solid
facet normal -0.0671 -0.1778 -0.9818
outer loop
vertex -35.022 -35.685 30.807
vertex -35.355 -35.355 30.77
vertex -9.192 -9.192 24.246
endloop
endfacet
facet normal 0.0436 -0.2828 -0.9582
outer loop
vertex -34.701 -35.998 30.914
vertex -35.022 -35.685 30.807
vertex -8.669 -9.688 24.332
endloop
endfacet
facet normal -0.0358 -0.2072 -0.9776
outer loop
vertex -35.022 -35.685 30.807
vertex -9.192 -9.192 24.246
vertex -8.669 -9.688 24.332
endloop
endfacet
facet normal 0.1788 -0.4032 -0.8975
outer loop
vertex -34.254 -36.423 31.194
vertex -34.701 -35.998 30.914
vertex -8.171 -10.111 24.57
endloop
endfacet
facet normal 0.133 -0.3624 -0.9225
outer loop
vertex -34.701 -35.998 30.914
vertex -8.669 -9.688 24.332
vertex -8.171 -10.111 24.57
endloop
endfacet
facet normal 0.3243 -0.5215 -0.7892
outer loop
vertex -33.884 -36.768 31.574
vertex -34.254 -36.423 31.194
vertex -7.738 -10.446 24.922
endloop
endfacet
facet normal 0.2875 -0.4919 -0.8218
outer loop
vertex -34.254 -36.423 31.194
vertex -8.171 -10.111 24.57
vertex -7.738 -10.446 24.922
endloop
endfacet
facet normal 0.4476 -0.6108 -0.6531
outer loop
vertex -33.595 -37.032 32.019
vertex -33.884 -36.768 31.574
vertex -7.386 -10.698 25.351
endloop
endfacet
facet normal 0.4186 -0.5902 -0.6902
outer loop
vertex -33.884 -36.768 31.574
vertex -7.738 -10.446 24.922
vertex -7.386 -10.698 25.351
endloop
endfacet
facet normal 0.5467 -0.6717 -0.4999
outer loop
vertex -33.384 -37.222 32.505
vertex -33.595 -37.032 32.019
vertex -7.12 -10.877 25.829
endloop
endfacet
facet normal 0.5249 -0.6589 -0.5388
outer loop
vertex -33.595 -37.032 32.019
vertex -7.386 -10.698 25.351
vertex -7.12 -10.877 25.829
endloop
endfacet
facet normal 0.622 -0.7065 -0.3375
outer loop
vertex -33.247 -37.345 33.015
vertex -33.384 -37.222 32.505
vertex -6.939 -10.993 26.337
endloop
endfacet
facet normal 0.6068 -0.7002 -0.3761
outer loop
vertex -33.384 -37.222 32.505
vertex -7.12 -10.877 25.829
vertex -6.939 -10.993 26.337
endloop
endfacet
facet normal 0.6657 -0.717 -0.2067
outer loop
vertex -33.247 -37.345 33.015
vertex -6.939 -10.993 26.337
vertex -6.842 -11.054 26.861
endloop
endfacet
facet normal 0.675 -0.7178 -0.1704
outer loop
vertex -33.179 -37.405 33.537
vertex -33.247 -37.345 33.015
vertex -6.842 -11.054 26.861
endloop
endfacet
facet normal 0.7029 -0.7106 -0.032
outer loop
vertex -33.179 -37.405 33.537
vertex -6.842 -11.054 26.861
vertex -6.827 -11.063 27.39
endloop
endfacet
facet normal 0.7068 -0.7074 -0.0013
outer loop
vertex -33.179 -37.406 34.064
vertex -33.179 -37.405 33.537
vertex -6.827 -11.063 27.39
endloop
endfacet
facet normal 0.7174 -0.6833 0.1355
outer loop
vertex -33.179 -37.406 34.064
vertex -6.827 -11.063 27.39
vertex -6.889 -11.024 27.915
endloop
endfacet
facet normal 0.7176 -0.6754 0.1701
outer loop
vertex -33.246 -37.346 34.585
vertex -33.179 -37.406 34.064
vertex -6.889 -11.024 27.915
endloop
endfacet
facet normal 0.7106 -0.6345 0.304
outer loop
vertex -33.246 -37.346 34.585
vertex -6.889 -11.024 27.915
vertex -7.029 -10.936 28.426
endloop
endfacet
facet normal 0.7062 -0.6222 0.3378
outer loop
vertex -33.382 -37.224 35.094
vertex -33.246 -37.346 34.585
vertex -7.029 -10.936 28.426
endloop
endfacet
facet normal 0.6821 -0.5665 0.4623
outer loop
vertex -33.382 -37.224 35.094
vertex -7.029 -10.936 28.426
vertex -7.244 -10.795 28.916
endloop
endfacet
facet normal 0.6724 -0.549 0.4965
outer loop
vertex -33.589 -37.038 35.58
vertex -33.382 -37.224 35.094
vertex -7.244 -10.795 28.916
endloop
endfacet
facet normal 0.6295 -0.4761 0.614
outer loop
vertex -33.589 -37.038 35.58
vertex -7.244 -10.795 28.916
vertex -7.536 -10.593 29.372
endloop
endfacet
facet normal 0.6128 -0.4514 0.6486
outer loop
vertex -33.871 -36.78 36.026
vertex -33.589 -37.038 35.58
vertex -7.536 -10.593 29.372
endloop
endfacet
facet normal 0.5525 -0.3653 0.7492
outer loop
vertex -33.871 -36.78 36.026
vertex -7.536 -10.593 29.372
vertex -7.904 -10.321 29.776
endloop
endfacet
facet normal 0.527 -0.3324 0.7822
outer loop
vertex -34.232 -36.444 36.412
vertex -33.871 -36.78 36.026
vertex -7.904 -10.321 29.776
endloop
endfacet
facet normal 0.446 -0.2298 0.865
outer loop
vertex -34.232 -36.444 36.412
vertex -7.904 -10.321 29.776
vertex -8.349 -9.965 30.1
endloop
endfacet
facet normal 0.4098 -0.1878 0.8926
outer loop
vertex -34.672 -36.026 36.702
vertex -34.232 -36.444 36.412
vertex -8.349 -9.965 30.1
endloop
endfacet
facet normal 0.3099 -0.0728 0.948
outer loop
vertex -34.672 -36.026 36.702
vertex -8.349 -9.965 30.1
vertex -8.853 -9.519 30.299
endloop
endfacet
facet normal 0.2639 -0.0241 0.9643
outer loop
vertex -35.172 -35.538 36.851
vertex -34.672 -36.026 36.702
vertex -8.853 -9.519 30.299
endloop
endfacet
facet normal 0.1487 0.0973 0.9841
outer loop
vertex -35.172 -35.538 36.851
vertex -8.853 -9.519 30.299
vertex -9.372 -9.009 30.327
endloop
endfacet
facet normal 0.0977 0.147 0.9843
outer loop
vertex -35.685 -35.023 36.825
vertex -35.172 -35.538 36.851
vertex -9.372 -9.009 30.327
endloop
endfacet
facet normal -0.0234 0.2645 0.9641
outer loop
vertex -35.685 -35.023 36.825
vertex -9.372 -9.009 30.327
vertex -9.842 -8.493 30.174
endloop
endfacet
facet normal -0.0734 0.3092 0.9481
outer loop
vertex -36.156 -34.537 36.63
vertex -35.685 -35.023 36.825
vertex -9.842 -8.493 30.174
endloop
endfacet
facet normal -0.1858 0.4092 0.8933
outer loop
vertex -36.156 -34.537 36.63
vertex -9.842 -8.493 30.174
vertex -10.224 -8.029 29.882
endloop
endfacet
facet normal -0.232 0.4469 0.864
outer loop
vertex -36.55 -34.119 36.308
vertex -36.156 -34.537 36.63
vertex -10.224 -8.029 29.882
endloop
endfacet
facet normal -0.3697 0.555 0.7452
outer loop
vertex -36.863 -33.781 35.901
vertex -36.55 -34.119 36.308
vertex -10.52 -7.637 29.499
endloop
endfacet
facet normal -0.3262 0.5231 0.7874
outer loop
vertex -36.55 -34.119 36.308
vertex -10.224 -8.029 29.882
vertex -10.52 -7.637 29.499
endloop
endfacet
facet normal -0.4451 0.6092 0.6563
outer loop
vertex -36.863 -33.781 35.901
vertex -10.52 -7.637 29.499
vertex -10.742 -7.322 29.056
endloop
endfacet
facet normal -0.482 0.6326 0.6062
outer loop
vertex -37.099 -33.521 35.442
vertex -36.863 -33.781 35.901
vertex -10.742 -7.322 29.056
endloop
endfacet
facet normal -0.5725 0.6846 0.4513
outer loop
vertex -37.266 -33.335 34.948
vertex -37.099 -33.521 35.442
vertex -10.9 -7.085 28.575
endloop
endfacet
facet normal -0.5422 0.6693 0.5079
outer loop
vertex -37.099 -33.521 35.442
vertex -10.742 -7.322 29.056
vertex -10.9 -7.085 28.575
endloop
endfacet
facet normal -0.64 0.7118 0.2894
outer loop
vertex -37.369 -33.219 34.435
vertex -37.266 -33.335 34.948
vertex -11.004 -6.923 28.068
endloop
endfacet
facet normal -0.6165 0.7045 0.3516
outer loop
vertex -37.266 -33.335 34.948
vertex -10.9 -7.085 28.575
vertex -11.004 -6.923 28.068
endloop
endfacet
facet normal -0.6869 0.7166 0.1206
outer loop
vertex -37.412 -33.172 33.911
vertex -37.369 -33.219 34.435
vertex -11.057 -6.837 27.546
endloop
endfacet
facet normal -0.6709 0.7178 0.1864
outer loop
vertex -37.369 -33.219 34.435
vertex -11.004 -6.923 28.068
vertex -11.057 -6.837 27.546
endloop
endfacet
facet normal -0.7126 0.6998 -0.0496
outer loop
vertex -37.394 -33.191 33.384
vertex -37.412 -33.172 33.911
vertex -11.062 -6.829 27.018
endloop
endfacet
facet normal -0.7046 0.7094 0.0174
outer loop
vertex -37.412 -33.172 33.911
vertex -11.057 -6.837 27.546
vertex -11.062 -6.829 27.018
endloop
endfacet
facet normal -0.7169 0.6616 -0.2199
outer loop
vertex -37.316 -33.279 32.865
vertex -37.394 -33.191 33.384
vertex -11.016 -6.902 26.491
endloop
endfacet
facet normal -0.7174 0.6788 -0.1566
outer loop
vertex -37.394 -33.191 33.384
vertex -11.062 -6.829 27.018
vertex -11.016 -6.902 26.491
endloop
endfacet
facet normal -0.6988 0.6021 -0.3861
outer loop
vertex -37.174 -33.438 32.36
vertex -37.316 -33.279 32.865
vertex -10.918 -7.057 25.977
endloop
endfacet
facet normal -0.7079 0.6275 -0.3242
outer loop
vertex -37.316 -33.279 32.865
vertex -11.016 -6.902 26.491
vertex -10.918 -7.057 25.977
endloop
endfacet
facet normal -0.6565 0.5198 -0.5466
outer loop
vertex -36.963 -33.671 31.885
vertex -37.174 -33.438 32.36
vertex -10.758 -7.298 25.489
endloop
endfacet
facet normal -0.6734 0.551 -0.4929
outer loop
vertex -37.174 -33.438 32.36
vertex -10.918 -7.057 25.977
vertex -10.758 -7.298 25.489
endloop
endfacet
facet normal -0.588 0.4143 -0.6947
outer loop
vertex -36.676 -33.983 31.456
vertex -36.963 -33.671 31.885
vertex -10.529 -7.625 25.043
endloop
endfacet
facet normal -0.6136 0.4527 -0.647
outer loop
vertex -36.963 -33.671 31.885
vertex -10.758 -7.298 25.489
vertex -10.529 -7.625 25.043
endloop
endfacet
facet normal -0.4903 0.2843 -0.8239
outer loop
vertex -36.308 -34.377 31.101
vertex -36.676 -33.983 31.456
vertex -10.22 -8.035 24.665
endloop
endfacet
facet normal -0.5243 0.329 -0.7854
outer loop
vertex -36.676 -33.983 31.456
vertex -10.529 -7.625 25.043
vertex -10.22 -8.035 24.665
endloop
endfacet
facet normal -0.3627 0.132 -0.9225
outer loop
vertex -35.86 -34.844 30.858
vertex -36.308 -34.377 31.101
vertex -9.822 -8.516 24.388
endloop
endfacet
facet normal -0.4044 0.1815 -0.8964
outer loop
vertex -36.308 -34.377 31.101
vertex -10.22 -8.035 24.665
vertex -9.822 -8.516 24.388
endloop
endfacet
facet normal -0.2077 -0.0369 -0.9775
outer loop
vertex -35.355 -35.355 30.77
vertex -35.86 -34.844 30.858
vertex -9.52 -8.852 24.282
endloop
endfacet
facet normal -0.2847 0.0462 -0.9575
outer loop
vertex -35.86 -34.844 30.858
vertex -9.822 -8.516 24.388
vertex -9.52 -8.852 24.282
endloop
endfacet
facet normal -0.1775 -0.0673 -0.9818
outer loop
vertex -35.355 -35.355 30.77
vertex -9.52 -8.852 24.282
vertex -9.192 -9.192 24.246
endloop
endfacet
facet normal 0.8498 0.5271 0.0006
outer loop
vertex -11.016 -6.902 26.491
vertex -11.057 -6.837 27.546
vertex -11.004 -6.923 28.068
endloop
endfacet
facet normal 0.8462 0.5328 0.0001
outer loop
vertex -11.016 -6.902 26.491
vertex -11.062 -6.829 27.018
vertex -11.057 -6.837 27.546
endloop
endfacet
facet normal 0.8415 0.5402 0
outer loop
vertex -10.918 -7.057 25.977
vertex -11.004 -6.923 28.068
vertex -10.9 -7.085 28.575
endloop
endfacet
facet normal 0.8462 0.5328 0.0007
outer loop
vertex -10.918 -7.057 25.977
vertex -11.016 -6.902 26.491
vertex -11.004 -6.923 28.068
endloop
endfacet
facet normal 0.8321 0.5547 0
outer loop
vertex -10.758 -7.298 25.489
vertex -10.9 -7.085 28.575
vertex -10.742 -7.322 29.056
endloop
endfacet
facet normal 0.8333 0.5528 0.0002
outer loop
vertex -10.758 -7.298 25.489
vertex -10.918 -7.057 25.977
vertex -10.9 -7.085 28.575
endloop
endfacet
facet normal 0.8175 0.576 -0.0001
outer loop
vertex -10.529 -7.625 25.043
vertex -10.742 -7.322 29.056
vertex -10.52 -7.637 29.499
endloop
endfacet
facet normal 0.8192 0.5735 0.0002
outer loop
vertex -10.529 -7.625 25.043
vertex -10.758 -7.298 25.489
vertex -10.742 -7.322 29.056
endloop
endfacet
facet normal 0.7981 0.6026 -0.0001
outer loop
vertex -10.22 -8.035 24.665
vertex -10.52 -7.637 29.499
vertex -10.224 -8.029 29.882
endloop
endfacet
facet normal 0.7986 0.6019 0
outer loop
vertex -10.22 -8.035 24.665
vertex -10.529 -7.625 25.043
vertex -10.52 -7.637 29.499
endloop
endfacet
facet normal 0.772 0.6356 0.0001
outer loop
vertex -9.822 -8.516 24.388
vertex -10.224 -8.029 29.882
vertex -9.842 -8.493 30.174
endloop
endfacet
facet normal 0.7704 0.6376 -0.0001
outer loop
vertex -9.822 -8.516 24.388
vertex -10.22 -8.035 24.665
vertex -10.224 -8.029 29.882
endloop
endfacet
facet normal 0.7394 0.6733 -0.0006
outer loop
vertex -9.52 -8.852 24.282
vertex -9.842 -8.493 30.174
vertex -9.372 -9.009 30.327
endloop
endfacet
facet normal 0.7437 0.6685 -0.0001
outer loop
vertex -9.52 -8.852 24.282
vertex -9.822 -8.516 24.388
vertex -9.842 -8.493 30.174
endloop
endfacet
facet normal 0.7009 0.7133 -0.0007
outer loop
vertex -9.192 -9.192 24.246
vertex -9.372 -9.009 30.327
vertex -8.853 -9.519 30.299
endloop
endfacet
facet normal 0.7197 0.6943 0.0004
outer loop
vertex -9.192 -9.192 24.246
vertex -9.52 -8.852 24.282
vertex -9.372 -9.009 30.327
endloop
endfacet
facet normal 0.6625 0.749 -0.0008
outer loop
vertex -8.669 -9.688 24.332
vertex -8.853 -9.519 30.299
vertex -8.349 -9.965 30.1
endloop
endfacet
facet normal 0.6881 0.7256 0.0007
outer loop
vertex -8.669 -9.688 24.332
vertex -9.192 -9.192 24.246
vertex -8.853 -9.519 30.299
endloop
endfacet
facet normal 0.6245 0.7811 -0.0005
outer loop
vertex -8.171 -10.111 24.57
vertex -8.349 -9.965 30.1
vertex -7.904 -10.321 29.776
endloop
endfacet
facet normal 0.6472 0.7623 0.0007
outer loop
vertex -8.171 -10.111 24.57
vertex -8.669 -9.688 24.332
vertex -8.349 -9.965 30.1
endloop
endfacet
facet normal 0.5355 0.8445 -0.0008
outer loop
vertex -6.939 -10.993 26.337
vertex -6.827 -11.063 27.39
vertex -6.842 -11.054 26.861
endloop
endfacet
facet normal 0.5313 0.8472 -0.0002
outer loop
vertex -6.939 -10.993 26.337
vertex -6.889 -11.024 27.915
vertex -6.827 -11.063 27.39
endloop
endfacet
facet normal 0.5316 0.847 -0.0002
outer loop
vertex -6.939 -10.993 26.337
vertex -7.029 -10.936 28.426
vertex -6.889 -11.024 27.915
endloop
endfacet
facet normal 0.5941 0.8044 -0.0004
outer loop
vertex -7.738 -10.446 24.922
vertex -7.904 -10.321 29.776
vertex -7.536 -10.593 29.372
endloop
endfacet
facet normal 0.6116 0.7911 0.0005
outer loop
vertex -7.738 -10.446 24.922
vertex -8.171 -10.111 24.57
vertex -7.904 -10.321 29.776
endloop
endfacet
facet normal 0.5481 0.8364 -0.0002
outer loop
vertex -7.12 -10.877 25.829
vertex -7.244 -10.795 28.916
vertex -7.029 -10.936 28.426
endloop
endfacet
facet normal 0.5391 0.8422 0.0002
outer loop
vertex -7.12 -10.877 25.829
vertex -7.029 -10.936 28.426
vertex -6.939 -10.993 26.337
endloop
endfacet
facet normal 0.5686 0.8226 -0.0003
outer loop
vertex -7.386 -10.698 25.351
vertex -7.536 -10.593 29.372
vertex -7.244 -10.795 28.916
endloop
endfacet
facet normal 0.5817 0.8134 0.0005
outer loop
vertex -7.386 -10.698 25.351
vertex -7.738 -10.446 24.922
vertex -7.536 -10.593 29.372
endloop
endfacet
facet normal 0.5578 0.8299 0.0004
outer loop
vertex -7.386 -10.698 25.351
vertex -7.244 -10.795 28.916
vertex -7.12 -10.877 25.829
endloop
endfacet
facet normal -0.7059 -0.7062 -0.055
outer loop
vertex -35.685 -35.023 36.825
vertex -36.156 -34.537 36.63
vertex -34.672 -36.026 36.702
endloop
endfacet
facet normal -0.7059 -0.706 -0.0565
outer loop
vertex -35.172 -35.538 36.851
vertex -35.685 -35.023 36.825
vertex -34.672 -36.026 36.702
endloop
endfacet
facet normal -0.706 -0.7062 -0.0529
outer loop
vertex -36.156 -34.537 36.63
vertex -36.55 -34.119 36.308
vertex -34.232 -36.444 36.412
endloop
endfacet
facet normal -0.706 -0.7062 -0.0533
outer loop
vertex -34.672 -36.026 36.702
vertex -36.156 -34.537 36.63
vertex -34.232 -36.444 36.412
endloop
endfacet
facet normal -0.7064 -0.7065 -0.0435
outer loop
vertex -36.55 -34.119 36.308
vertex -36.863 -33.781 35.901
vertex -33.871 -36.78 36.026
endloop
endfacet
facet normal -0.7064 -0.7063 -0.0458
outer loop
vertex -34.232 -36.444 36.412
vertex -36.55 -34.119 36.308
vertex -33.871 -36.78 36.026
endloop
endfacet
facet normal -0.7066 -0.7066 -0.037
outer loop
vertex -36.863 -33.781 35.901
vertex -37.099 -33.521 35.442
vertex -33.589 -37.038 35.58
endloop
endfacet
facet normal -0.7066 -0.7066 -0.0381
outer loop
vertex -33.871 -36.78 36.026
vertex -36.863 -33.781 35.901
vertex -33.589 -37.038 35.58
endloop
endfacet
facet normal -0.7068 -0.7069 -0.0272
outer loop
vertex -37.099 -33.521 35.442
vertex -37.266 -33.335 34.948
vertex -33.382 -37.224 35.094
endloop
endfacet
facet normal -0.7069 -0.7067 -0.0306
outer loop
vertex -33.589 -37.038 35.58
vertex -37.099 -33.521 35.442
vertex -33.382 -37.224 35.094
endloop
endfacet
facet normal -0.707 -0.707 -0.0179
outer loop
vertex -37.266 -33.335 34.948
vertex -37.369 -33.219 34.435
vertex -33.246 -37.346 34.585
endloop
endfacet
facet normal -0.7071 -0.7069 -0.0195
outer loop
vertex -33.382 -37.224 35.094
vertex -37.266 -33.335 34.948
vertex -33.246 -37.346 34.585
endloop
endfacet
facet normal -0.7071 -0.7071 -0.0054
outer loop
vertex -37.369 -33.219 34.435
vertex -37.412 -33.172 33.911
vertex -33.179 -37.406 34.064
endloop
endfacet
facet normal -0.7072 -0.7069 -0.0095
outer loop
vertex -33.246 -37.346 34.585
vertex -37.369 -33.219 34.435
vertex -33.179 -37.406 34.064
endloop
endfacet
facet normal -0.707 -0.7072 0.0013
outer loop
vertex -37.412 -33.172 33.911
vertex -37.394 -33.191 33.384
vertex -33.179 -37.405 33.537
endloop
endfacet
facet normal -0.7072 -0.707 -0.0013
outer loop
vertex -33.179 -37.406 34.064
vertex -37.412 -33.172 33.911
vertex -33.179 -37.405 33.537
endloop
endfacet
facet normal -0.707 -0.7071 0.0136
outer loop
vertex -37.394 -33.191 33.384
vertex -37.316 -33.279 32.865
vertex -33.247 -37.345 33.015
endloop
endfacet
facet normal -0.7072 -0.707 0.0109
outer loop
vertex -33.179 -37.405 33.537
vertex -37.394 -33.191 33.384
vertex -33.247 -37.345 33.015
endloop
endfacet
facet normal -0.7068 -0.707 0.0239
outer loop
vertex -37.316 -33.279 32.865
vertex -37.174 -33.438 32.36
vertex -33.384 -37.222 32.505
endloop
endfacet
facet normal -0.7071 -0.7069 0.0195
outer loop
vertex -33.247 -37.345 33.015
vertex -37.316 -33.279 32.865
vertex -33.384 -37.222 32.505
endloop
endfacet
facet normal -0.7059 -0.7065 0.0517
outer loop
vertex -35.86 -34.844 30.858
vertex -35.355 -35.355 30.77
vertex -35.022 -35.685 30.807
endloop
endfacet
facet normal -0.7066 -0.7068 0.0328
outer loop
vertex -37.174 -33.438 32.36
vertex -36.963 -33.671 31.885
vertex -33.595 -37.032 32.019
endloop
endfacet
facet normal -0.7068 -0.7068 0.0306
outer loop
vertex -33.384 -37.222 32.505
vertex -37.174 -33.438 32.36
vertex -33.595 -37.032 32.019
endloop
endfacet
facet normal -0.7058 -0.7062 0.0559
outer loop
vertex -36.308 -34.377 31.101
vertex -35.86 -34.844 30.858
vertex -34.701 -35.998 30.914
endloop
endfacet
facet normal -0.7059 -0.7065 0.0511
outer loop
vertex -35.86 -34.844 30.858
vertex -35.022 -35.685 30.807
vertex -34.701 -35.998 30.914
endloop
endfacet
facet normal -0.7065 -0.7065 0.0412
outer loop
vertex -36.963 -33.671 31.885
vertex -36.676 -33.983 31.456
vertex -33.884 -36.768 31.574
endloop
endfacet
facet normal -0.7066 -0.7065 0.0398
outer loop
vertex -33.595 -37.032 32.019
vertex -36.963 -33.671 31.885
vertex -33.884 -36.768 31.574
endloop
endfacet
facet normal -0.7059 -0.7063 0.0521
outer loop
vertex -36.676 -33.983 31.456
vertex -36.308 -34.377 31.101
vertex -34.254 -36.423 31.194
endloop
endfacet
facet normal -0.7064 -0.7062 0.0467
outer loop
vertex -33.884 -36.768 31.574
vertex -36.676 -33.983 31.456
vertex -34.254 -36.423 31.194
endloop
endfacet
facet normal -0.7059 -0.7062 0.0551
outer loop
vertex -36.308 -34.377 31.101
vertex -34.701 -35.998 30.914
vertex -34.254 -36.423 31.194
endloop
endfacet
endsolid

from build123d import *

# Parameters (mm, degrees)
CYLINDER015_R               = 50
CYLINDER015_DEPTH           = 67
CYLINDER014_R               = 55
CYLINDER014_DEPTH           = 67
CYLINDER013_R               = 13
CYLINDER013_DEPTH           = 60
CYLINDER012_R               = 3
CYLINDER012_DEPTH           = 54
CYLINDER012_PLACEMENT_ANGLE = 80
CUT009_PLACEMENT_ANGLE      = 45


with BuildPart() as inner001:
    # Cylinder015 → Cylinder015 (new body)
    with BuildSketch(Plane.XY):
        Circle(CYLINDER015_R)
    extrude(amount=CYLINDER015_DEPTH)


with BuildPart() as case001:
    # Cylinder014 → Cylinder014 (new body)
    with BuildSketch(Plane.XY):
        Circle(CYLINDER014_R)
    extrude(amount=CYLINDER014_DEPTH)

    # Cut008: cut Inner001
    add(inner001.part, mode=Mode.SUBTRACT)


with BuildPart() as cylinder016:
    # Cylinder013 → Cylinder013 (new body)
    with BuildSketch(Plane.XY):
        Circle(CYLINDER013_R)
    extrude(amount=CYLINDER013_DEPTH)


with BuildPart() as support_final:
    # Cylinder012 → Cylinder012 (new body)
    with BuildSketch(Plane.XY):
        Circle(CYLINDER012_R)
    extrude(amount=CYLINDER012_DEPTH)


with BuildPart() as support_final_1:
    # Cylinder012 placement: moved
    add(support_final.part.moved(Location((0, 0, 25))).rotate(Axis((0, 0, 25), (0, 1, 0)), CYLINDER012_PLACEMENT_ANGLE))

    # Cut007: cut Cylinder016
    add(cylinder016.part, mode=Mode.SUBTRACT)

    # Cut009: cut Case001
    add(case001.part, mode=Mode.SUBTRACT)


with BuildPart() as support_final_2:
    # Cut009 placement: moved
    add(support_final_1.part.rotate(Axis((0, 0, 0), (0, 0, 1)), CUT009_PLACEMENT_ANGLE))


with BuildPart() as part_mirroring001:
    # Part__Mirroring001: instance of Support Final
    add(support_final_2.part.mirror(Plane(origin=(0, 0, 0), x_dir=(0, -1, 0), z_dir=(1, 0, 0))))


with BuildPart() as part_mirroring003:
    # Part__Mirroring003: instance of Part__Mirroring001
    add(part_mirroring001.part.mirror(Plane(origin=(0, 0, 0), x_dir=(1, 0, 0), z_dir=(0, 1, 0))))


solid = part_mirroring003.part
